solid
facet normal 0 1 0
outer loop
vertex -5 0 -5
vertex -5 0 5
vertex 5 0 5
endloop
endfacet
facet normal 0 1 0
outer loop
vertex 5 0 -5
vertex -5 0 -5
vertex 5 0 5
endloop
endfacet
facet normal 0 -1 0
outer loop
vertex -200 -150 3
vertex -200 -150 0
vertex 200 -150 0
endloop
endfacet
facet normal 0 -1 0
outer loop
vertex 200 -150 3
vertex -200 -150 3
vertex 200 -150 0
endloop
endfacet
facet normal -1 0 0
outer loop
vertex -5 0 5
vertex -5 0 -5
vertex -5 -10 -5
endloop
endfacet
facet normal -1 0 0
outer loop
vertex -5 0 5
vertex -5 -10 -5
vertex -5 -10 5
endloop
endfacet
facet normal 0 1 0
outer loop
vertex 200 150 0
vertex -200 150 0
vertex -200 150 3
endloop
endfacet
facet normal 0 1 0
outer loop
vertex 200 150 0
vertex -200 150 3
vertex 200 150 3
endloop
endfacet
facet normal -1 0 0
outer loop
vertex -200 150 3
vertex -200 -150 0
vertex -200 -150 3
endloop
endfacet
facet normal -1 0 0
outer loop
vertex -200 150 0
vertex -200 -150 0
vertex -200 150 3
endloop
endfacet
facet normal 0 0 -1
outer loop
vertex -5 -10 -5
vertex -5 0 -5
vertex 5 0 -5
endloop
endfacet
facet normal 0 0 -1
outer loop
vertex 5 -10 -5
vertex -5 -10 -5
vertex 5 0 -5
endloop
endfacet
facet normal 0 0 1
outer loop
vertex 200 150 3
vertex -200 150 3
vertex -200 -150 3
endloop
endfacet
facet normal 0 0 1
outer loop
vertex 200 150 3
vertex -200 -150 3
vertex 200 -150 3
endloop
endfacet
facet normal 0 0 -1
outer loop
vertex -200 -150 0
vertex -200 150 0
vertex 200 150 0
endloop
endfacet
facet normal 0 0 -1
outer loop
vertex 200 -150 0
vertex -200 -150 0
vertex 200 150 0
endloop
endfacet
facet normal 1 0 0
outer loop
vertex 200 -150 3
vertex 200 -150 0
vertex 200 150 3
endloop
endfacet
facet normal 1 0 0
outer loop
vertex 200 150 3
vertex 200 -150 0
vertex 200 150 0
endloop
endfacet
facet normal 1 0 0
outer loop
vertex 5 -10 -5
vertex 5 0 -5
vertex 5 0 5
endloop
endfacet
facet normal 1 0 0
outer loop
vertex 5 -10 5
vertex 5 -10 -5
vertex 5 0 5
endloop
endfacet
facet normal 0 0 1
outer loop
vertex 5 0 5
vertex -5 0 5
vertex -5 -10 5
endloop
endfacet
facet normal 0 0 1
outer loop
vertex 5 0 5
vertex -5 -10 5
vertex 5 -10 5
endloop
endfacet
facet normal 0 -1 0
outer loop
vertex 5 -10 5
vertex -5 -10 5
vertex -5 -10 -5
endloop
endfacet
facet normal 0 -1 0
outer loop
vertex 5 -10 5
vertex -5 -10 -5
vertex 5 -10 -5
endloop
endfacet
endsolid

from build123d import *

# Parameters (mm, degrees)
F0_W     = 400
F0_H     = 300
F1_DEPTH = 3
F2_W     = 10
F2_H     = 10
F3_DEPTH = 10


with BuildPart() as f1:
    # F0 (on Top) → F1 (new body)
    with BuildSketch(Plane.XY):
        Rectangle(F0_W, F0_H)
    extrude(amount=F1_DEPTH)


with BuildPart() as f3:
    # F2 (on Front) → F3 (new body)
    with BuildSketch(Plane.XZ):
        Rectangle(F2_W, F2_H)
    extrude(amount=F3_DEPTH)


solid = Compound([f1.part, f3.part])
